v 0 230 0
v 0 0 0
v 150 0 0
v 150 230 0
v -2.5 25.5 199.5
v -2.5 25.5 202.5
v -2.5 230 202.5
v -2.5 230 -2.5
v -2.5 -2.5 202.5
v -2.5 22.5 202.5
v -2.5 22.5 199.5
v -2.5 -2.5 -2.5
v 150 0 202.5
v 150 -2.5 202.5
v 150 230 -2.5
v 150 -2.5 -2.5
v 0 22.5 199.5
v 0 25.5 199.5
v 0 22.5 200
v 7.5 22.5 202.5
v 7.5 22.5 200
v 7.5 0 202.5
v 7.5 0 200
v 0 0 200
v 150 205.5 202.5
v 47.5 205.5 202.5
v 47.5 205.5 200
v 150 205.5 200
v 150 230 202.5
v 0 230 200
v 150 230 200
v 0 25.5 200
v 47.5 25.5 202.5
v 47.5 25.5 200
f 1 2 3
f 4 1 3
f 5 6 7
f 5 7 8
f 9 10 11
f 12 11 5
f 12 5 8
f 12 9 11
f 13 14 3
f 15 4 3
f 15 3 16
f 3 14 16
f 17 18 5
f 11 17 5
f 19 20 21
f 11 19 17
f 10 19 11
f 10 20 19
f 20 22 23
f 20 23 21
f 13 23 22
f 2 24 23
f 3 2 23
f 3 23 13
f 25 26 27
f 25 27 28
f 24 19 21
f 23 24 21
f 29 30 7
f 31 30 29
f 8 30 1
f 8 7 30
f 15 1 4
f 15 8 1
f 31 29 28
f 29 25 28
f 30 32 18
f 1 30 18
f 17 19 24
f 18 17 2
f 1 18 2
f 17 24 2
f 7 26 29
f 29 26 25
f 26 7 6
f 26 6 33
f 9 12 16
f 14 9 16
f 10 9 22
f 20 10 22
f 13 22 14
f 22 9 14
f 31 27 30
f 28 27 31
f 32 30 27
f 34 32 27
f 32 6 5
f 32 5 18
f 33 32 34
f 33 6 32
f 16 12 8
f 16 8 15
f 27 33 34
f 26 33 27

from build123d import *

# Parameters (mm, degrees)
SKETCH_1_W          = 150
SKETCH_1_H          = 200
EXTRUDE_1_DEPTH     = 230
SHELL_1_T           = 2.5
CUT_EXTRUDE_1_DEPTH = 3
SKETCH_6_W          = 142.5
SKETCH_6_H          = 22.5
CUT_EXTRUDE_2_DEPTH = 30


with BuildPart() as part:
    # 草图1 → 凸台-拉伸1 (new body)
    with BuildSketch(Plane(origin=(0, 0, 0), x_dir=(1, 0, 0), z_dir=(0, 1, 0))):
        with Locations((75, -100)):
            Rectangle(SKETCH_1_W, SKETCH_1_H)
    extrude(amount=EXTRUDE_1_DEPTH)

    # 抽壳1
    shell_1_openings = [part.faces().sort_by_distance(p)[0] for p in [
        (150, 115, 100),
        (75, 230, 100),
    ]]
    offset(amount=SHELL_1_T, openings=shell_1_openings, kind=Kind.INTERSECTION)

    # 草图2 → 切除-拉伸1 (cut)
    with BuildSketch(Plane.XY.offset(202.5)):
        Polygon((-2.5, 25.5), (47.5, 25.5), (47.5, 205.5), (150, 205.5), (150, 30.5), (150, 27.5), (150, 22.5), (-2.5, 22.5), align=None)
    extrude(amount=-CUT_EXTRUDE_1_DEPTH, mode=Mode.SUBTRACT)

    # 草图6 → 切除-拉伸2 (cut)
    with BuildSketch(Plane.XY.offset(202.5)):
        with Locations((78.75, 11.25)):
            Rectangle(SKETCH_6_W, SKETCH_6_H)
    extrude(amount=-CUT_EXTRUDE_2_DEPTH, mode=Mode.SUBTRACT)


solid = part.part
